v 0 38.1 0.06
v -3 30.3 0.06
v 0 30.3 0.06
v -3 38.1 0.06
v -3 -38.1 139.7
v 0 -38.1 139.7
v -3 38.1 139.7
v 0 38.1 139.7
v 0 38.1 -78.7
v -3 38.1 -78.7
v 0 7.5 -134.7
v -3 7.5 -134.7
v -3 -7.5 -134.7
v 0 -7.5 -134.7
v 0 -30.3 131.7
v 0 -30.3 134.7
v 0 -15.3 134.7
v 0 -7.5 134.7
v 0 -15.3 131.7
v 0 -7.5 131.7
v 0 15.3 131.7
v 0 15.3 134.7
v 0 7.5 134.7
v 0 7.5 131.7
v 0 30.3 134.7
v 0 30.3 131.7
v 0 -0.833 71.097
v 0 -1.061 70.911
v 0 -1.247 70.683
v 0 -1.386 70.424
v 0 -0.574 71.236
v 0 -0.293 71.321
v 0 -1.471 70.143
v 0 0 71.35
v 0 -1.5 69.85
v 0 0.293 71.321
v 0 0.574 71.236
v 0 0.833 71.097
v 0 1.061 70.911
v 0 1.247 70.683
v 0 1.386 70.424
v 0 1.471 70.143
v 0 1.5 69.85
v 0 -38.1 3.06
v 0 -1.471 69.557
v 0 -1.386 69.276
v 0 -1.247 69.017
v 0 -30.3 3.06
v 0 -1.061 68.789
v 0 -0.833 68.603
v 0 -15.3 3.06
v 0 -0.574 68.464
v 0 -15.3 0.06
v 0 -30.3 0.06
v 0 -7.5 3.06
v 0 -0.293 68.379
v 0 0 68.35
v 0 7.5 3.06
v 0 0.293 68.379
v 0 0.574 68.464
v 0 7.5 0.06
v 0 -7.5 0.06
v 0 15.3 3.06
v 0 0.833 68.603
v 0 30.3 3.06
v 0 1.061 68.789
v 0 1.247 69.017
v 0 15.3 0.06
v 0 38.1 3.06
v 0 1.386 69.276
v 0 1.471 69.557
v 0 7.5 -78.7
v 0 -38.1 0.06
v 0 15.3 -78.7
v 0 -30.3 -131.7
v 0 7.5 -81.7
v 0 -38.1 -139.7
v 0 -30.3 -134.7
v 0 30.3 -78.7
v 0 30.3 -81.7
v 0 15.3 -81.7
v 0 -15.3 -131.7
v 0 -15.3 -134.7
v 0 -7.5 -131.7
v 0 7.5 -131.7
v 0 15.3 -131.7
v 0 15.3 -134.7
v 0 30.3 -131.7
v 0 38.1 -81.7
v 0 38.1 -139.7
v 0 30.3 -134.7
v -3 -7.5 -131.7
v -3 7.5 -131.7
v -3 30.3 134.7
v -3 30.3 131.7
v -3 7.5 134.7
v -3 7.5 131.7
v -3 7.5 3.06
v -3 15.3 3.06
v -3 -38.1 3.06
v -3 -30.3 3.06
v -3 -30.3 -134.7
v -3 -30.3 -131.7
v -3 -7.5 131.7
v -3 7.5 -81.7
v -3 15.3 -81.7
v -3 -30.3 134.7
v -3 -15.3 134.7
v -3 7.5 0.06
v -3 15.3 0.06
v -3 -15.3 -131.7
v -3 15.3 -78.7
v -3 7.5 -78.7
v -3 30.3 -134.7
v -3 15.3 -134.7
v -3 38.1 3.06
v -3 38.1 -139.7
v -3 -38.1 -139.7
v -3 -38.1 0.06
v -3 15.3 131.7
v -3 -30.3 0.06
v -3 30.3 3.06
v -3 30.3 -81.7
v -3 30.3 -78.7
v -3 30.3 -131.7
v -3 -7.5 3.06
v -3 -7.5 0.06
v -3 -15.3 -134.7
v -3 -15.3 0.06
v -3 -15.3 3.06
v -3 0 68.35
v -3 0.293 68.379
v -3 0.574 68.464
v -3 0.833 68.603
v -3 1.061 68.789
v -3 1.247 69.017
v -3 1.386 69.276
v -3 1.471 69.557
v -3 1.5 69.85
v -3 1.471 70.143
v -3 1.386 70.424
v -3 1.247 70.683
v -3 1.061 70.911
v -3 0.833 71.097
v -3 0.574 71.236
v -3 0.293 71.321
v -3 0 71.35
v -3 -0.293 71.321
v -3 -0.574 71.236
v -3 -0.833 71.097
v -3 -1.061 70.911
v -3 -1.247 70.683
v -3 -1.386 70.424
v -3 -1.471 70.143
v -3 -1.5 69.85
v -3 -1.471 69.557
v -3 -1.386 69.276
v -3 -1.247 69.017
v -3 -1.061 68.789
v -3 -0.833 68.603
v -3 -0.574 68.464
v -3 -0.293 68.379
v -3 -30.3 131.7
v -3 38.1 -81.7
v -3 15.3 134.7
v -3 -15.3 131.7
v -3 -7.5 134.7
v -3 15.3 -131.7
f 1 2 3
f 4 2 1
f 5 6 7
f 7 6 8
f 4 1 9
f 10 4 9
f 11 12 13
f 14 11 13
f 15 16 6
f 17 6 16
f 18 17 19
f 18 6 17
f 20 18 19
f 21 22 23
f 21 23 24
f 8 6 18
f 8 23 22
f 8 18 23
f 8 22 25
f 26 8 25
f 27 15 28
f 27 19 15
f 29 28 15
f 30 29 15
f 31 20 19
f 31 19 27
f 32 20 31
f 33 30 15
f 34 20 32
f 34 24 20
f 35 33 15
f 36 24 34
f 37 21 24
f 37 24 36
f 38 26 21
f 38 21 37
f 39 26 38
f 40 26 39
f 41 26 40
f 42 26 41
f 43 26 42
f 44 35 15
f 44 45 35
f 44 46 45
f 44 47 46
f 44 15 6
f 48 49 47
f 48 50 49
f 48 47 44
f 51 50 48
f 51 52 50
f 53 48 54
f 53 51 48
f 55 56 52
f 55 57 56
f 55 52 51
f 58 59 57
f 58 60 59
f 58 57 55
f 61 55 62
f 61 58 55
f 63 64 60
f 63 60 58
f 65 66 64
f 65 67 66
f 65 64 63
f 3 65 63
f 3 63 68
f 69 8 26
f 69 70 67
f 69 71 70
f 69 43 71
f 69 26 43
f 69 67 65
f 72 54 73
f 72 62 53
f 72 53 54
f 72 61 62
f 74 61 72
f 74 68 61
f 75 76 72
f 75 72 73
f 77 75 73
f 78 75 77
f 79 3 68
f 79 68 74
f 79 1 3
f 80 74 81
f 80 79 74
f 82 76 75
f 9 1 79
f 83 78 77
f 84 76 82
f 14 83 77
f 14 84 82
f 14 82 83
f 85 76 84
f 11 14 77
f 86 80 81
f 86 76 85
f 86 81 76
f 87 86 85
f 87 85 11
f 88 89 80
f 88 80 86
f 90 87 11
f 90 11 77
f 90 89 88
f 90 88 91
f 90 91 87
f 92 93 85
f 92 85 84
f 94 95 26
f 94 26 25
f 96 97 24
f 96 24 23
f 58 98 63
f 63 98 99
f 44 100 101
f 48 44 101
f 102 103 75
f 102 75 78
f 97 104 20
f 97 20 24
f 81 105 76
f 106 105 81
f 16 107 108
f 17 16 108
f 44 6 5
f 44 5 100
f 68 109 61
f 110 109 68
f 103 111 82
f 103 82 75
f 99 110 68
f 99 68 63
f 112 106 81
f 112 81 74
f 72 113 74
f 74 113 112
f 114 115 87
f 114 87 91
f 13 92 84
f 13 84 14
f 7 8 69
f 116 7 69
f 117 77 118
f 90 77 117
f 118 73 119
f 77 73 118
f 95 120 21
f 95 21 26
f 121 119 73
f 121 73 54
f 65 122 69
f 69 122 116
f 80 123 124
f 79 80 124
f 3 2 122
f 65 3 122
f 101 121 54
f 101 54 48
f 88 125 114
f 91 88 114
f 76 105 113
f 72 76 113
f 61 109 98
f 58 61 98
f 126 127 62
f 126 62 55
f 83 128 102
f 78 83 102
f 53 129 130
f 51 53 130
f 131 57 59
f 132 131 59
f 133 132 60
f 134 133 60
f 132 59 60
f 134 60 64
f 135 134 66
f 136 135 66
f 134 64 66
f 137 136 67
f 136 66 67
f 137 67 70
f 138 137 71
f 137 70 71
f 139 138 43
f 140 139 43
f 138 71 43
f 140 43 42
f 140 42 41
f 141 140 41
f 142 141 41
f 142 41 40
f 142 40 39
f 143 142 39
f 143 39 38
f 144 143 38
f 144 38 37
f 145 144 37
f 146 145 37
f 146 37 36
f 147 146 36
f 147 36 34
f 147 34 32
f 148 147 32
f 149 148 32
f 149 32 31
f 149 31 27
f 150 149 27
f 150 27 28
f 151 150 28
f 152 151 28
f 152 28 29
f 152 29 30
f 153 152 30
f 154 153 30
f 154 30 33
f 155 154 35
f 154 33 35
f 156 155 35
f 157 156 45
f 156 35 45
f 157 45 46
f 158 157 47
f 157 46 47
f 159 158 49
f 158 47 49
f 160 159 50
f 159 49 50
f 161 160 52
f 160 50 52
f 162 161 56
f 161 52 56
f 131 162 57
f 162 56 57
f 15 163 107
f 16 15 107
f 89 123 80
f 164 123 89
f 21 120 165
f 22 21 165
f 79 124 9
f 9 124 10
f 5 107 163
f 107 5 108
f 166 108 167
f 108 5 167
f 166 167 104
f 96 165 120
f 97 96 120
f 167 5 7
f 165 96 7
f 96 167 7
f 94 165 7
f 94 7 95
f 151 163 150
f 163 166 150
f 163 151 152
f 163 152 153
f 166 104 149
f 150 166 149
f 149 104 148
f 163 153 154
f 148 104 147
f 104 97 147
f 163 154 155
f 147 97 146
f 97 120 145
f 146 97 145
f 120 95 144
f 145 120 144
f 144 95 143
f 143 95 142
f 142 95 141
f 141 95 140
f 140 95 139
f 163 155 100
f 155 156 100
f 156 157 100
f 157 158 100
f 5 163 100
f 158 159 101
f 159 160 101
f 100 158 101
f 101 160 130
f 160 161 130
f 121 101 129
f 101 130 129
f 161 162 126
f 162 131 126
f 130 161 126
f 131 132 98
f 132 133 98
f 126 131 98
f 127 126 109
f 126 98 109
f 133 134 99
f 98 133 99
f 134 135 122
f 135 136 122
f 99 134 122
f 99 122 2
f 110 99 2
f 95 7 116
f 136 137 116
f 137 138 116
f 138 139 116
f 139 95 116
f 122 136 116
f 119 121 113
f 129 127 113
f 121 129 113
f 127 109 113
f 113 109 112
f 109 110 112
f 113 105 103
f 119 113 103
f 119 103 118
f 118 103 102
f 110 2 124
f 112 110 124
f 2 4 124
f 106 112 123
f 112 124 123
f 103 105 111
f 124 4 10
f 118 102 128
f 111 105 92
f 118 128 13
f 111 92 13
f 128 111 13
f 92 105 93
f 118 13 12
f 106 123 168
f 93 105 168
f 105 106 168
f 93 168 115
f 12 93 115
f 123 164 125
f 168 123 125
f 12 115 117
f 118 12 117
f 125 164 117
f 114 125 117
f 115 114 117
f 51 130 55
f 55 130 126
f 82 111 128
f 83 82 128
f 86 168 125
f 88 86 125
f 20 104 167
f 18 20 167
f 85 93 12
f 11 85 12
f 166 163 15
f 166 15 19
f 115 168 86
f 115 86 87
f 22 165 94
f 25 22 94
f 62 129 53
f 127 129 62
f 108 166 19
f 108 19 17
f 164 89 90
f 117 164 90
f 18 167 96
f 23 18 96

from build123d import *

# Parameters (mm, degrees)
SKETCH1_W                       = 279.4
SKETCH1_H                       = 76.2
BOSS_EXTRUDE1_DEPTH             = 3
SKETCH3_W                       = 3
SKETCH3_H                       = 15
CUT_EXTRUDE1_DEPTH              = 145.833352512
LPATTERN1_COUNT                 = 3
LPATTERN1_PITCH                 = 22.8
MIRROR1_COPY_1_SKETCH_W         = 3
MIRROR1_COPY_1_SKETCH_H         = 15
MIRROR1_COPY_1_DEPTH            = 145.833352512
MIRROR1_COPY_2_SKETCH_W         = 3
MIRROR1_COPY_2_SKETCH_H         = 15
MIRROR1_COPY_2_DEPTH            = 145.833352512
F_3_0MM_CLEARANCE_DOWEL_HOLE1_D = 3
SKETCH6_W                       = 3
SKETCH6_H                       = 7.8
CUT_EXTRUDE2_DEPTH              = 145.833352512
LPATTERN2_COUNT                 = 4
LPATTERN2_PITCH                 = 22.8
SKETCH7_W                       = 3
SKETCH7_H                       = 7.8
CUT_EXTRUDE3_DEPTH              = 10
LPATTERN3_COUNT                 = 2
LPATTERN3_PITCH                 = 22.8


with BuildPart() as part:
    # Sketch1 → Boss-Extrude1 (new body)
    with BuildSketch(Plane(origin=(0, 0, 0), x_dir=(0, 0, -1), z_dir=(1, 0, 0))):
        Rectangle(SKETCH1_W, SKETCH1_H)
    extrude(amount=-BOSS_EXTRUDE1_DEPTH)

    # Sketch3 → Cut-Extrude1 (cut, through all)
    with BuildSketch(Plane.ZY.offset(3)):
        with Locations((133.2, 22.8)):
            Rectangle(SKETCH3_W, SKETCH3_H)
    cut_extrude1 = extrude(amount=-CUT_EXTRUDE1_DEPTH, mode=Mode.SUBTRACT)

    # LPattern1: Cut-Extrude1 ×3
    with Locations(*[(0, -i * LPATTERN1_PITCH, 0) for i in range(1, LPATTERN1_COUNT)]):
        add(cut_extrude1, mode=Mode.SUBTRACT)

    # Mirror1: Cut-Extrude1 across plane
    add(cut_extrude1.mirror(Plane.XY), mode=Mode.SUBTRACT)

    # Mirror1 copy 1 sketch → Mirror1 copy 1 (cut, through all)
    with BuildSketch(Plane(origin=(-3, -22.8, 0), x_dir=(0, 0, -1), z_dir=(-1, 0, 0))):
        with Locations((133.2, -22.8)):
            Rectangle(MIRROR1_COPY_1_SKETCH_W, MIRROR1_COPY_1_SKETCH_H)
    extrude(amount=-MIRROR1_COPY_1_DEPTH, mode=Mode.SUBTRACT)

    # Mirror1 copy 2 sketch → Mirror1 copy 2 (cut, through all)
    with BuildSketch(Plane(origin=(-3, -45.6, 0), x_dir=(0, 0, -1), z_dir=(-1, 0, 0))):
        with Locations((133.2, -22.8)):
            Rectangle(MIRROR1_COPY_2_SKETCH_W, MIRROR1_COPY_2_SKETCH_H)
    extrude(amount=-MIRROR1_COPY_2_DEPTH, mode=Mode.SUBTRACT)

    # Ø3.0mm Clearance Dowel Hole1 (through all)
    with Locations(Plane.ZY.offset(3)):
        with Locations((69.85, 0)):
            Hole(F_3_0MM_CLEARANCE_DOWEL_HOLE1_D / 2)

    # Sketch6 → Cut-Extrude2 (cut, through all)
    with BuildSketch(Plane.ZY.offset(3)):
        with Locations((1.56, 34.2)):
            Rectangle(SKETCH6_W, SKETCH6_H)
    cut_extrude2 = extrude(amount=-CUT_EXTRUDE2_DEPTH, mode=Mode.SUBTRACT)

    # LPattern2: Cut-Extrude2 ×4
    with Locations(*[(0, -i * LPATTERN2_PITCH, 0) for i in range(1, LPATTERN2_COUNT)]):
        add(cut_extrude2, mode=Mode.SUBTRACT)

    # Sketch7 → Cut-Extrude3 (cut)
    with BuildSketch(Plane.ZY.offset(3)):
        with Locations((-80.2, 34.2)):
            Rectangle(SKETCH7_W, SKETCH7_H)
    cut_extrude3 = extrude(amount=-CUT_EXTRUDE3_DEPTH, mode=Mode.SUBTRACT)

    # LPattern3: Cut-Extrude3 ×2
    with Locations(*[(0, -i * LPATTERN3_PITCH, 0) for i in range(1, LPATTERN3_COUNT)]):
        add(cut_extrude3, mode=Mode.SUBTRACT)


solid = part.part
